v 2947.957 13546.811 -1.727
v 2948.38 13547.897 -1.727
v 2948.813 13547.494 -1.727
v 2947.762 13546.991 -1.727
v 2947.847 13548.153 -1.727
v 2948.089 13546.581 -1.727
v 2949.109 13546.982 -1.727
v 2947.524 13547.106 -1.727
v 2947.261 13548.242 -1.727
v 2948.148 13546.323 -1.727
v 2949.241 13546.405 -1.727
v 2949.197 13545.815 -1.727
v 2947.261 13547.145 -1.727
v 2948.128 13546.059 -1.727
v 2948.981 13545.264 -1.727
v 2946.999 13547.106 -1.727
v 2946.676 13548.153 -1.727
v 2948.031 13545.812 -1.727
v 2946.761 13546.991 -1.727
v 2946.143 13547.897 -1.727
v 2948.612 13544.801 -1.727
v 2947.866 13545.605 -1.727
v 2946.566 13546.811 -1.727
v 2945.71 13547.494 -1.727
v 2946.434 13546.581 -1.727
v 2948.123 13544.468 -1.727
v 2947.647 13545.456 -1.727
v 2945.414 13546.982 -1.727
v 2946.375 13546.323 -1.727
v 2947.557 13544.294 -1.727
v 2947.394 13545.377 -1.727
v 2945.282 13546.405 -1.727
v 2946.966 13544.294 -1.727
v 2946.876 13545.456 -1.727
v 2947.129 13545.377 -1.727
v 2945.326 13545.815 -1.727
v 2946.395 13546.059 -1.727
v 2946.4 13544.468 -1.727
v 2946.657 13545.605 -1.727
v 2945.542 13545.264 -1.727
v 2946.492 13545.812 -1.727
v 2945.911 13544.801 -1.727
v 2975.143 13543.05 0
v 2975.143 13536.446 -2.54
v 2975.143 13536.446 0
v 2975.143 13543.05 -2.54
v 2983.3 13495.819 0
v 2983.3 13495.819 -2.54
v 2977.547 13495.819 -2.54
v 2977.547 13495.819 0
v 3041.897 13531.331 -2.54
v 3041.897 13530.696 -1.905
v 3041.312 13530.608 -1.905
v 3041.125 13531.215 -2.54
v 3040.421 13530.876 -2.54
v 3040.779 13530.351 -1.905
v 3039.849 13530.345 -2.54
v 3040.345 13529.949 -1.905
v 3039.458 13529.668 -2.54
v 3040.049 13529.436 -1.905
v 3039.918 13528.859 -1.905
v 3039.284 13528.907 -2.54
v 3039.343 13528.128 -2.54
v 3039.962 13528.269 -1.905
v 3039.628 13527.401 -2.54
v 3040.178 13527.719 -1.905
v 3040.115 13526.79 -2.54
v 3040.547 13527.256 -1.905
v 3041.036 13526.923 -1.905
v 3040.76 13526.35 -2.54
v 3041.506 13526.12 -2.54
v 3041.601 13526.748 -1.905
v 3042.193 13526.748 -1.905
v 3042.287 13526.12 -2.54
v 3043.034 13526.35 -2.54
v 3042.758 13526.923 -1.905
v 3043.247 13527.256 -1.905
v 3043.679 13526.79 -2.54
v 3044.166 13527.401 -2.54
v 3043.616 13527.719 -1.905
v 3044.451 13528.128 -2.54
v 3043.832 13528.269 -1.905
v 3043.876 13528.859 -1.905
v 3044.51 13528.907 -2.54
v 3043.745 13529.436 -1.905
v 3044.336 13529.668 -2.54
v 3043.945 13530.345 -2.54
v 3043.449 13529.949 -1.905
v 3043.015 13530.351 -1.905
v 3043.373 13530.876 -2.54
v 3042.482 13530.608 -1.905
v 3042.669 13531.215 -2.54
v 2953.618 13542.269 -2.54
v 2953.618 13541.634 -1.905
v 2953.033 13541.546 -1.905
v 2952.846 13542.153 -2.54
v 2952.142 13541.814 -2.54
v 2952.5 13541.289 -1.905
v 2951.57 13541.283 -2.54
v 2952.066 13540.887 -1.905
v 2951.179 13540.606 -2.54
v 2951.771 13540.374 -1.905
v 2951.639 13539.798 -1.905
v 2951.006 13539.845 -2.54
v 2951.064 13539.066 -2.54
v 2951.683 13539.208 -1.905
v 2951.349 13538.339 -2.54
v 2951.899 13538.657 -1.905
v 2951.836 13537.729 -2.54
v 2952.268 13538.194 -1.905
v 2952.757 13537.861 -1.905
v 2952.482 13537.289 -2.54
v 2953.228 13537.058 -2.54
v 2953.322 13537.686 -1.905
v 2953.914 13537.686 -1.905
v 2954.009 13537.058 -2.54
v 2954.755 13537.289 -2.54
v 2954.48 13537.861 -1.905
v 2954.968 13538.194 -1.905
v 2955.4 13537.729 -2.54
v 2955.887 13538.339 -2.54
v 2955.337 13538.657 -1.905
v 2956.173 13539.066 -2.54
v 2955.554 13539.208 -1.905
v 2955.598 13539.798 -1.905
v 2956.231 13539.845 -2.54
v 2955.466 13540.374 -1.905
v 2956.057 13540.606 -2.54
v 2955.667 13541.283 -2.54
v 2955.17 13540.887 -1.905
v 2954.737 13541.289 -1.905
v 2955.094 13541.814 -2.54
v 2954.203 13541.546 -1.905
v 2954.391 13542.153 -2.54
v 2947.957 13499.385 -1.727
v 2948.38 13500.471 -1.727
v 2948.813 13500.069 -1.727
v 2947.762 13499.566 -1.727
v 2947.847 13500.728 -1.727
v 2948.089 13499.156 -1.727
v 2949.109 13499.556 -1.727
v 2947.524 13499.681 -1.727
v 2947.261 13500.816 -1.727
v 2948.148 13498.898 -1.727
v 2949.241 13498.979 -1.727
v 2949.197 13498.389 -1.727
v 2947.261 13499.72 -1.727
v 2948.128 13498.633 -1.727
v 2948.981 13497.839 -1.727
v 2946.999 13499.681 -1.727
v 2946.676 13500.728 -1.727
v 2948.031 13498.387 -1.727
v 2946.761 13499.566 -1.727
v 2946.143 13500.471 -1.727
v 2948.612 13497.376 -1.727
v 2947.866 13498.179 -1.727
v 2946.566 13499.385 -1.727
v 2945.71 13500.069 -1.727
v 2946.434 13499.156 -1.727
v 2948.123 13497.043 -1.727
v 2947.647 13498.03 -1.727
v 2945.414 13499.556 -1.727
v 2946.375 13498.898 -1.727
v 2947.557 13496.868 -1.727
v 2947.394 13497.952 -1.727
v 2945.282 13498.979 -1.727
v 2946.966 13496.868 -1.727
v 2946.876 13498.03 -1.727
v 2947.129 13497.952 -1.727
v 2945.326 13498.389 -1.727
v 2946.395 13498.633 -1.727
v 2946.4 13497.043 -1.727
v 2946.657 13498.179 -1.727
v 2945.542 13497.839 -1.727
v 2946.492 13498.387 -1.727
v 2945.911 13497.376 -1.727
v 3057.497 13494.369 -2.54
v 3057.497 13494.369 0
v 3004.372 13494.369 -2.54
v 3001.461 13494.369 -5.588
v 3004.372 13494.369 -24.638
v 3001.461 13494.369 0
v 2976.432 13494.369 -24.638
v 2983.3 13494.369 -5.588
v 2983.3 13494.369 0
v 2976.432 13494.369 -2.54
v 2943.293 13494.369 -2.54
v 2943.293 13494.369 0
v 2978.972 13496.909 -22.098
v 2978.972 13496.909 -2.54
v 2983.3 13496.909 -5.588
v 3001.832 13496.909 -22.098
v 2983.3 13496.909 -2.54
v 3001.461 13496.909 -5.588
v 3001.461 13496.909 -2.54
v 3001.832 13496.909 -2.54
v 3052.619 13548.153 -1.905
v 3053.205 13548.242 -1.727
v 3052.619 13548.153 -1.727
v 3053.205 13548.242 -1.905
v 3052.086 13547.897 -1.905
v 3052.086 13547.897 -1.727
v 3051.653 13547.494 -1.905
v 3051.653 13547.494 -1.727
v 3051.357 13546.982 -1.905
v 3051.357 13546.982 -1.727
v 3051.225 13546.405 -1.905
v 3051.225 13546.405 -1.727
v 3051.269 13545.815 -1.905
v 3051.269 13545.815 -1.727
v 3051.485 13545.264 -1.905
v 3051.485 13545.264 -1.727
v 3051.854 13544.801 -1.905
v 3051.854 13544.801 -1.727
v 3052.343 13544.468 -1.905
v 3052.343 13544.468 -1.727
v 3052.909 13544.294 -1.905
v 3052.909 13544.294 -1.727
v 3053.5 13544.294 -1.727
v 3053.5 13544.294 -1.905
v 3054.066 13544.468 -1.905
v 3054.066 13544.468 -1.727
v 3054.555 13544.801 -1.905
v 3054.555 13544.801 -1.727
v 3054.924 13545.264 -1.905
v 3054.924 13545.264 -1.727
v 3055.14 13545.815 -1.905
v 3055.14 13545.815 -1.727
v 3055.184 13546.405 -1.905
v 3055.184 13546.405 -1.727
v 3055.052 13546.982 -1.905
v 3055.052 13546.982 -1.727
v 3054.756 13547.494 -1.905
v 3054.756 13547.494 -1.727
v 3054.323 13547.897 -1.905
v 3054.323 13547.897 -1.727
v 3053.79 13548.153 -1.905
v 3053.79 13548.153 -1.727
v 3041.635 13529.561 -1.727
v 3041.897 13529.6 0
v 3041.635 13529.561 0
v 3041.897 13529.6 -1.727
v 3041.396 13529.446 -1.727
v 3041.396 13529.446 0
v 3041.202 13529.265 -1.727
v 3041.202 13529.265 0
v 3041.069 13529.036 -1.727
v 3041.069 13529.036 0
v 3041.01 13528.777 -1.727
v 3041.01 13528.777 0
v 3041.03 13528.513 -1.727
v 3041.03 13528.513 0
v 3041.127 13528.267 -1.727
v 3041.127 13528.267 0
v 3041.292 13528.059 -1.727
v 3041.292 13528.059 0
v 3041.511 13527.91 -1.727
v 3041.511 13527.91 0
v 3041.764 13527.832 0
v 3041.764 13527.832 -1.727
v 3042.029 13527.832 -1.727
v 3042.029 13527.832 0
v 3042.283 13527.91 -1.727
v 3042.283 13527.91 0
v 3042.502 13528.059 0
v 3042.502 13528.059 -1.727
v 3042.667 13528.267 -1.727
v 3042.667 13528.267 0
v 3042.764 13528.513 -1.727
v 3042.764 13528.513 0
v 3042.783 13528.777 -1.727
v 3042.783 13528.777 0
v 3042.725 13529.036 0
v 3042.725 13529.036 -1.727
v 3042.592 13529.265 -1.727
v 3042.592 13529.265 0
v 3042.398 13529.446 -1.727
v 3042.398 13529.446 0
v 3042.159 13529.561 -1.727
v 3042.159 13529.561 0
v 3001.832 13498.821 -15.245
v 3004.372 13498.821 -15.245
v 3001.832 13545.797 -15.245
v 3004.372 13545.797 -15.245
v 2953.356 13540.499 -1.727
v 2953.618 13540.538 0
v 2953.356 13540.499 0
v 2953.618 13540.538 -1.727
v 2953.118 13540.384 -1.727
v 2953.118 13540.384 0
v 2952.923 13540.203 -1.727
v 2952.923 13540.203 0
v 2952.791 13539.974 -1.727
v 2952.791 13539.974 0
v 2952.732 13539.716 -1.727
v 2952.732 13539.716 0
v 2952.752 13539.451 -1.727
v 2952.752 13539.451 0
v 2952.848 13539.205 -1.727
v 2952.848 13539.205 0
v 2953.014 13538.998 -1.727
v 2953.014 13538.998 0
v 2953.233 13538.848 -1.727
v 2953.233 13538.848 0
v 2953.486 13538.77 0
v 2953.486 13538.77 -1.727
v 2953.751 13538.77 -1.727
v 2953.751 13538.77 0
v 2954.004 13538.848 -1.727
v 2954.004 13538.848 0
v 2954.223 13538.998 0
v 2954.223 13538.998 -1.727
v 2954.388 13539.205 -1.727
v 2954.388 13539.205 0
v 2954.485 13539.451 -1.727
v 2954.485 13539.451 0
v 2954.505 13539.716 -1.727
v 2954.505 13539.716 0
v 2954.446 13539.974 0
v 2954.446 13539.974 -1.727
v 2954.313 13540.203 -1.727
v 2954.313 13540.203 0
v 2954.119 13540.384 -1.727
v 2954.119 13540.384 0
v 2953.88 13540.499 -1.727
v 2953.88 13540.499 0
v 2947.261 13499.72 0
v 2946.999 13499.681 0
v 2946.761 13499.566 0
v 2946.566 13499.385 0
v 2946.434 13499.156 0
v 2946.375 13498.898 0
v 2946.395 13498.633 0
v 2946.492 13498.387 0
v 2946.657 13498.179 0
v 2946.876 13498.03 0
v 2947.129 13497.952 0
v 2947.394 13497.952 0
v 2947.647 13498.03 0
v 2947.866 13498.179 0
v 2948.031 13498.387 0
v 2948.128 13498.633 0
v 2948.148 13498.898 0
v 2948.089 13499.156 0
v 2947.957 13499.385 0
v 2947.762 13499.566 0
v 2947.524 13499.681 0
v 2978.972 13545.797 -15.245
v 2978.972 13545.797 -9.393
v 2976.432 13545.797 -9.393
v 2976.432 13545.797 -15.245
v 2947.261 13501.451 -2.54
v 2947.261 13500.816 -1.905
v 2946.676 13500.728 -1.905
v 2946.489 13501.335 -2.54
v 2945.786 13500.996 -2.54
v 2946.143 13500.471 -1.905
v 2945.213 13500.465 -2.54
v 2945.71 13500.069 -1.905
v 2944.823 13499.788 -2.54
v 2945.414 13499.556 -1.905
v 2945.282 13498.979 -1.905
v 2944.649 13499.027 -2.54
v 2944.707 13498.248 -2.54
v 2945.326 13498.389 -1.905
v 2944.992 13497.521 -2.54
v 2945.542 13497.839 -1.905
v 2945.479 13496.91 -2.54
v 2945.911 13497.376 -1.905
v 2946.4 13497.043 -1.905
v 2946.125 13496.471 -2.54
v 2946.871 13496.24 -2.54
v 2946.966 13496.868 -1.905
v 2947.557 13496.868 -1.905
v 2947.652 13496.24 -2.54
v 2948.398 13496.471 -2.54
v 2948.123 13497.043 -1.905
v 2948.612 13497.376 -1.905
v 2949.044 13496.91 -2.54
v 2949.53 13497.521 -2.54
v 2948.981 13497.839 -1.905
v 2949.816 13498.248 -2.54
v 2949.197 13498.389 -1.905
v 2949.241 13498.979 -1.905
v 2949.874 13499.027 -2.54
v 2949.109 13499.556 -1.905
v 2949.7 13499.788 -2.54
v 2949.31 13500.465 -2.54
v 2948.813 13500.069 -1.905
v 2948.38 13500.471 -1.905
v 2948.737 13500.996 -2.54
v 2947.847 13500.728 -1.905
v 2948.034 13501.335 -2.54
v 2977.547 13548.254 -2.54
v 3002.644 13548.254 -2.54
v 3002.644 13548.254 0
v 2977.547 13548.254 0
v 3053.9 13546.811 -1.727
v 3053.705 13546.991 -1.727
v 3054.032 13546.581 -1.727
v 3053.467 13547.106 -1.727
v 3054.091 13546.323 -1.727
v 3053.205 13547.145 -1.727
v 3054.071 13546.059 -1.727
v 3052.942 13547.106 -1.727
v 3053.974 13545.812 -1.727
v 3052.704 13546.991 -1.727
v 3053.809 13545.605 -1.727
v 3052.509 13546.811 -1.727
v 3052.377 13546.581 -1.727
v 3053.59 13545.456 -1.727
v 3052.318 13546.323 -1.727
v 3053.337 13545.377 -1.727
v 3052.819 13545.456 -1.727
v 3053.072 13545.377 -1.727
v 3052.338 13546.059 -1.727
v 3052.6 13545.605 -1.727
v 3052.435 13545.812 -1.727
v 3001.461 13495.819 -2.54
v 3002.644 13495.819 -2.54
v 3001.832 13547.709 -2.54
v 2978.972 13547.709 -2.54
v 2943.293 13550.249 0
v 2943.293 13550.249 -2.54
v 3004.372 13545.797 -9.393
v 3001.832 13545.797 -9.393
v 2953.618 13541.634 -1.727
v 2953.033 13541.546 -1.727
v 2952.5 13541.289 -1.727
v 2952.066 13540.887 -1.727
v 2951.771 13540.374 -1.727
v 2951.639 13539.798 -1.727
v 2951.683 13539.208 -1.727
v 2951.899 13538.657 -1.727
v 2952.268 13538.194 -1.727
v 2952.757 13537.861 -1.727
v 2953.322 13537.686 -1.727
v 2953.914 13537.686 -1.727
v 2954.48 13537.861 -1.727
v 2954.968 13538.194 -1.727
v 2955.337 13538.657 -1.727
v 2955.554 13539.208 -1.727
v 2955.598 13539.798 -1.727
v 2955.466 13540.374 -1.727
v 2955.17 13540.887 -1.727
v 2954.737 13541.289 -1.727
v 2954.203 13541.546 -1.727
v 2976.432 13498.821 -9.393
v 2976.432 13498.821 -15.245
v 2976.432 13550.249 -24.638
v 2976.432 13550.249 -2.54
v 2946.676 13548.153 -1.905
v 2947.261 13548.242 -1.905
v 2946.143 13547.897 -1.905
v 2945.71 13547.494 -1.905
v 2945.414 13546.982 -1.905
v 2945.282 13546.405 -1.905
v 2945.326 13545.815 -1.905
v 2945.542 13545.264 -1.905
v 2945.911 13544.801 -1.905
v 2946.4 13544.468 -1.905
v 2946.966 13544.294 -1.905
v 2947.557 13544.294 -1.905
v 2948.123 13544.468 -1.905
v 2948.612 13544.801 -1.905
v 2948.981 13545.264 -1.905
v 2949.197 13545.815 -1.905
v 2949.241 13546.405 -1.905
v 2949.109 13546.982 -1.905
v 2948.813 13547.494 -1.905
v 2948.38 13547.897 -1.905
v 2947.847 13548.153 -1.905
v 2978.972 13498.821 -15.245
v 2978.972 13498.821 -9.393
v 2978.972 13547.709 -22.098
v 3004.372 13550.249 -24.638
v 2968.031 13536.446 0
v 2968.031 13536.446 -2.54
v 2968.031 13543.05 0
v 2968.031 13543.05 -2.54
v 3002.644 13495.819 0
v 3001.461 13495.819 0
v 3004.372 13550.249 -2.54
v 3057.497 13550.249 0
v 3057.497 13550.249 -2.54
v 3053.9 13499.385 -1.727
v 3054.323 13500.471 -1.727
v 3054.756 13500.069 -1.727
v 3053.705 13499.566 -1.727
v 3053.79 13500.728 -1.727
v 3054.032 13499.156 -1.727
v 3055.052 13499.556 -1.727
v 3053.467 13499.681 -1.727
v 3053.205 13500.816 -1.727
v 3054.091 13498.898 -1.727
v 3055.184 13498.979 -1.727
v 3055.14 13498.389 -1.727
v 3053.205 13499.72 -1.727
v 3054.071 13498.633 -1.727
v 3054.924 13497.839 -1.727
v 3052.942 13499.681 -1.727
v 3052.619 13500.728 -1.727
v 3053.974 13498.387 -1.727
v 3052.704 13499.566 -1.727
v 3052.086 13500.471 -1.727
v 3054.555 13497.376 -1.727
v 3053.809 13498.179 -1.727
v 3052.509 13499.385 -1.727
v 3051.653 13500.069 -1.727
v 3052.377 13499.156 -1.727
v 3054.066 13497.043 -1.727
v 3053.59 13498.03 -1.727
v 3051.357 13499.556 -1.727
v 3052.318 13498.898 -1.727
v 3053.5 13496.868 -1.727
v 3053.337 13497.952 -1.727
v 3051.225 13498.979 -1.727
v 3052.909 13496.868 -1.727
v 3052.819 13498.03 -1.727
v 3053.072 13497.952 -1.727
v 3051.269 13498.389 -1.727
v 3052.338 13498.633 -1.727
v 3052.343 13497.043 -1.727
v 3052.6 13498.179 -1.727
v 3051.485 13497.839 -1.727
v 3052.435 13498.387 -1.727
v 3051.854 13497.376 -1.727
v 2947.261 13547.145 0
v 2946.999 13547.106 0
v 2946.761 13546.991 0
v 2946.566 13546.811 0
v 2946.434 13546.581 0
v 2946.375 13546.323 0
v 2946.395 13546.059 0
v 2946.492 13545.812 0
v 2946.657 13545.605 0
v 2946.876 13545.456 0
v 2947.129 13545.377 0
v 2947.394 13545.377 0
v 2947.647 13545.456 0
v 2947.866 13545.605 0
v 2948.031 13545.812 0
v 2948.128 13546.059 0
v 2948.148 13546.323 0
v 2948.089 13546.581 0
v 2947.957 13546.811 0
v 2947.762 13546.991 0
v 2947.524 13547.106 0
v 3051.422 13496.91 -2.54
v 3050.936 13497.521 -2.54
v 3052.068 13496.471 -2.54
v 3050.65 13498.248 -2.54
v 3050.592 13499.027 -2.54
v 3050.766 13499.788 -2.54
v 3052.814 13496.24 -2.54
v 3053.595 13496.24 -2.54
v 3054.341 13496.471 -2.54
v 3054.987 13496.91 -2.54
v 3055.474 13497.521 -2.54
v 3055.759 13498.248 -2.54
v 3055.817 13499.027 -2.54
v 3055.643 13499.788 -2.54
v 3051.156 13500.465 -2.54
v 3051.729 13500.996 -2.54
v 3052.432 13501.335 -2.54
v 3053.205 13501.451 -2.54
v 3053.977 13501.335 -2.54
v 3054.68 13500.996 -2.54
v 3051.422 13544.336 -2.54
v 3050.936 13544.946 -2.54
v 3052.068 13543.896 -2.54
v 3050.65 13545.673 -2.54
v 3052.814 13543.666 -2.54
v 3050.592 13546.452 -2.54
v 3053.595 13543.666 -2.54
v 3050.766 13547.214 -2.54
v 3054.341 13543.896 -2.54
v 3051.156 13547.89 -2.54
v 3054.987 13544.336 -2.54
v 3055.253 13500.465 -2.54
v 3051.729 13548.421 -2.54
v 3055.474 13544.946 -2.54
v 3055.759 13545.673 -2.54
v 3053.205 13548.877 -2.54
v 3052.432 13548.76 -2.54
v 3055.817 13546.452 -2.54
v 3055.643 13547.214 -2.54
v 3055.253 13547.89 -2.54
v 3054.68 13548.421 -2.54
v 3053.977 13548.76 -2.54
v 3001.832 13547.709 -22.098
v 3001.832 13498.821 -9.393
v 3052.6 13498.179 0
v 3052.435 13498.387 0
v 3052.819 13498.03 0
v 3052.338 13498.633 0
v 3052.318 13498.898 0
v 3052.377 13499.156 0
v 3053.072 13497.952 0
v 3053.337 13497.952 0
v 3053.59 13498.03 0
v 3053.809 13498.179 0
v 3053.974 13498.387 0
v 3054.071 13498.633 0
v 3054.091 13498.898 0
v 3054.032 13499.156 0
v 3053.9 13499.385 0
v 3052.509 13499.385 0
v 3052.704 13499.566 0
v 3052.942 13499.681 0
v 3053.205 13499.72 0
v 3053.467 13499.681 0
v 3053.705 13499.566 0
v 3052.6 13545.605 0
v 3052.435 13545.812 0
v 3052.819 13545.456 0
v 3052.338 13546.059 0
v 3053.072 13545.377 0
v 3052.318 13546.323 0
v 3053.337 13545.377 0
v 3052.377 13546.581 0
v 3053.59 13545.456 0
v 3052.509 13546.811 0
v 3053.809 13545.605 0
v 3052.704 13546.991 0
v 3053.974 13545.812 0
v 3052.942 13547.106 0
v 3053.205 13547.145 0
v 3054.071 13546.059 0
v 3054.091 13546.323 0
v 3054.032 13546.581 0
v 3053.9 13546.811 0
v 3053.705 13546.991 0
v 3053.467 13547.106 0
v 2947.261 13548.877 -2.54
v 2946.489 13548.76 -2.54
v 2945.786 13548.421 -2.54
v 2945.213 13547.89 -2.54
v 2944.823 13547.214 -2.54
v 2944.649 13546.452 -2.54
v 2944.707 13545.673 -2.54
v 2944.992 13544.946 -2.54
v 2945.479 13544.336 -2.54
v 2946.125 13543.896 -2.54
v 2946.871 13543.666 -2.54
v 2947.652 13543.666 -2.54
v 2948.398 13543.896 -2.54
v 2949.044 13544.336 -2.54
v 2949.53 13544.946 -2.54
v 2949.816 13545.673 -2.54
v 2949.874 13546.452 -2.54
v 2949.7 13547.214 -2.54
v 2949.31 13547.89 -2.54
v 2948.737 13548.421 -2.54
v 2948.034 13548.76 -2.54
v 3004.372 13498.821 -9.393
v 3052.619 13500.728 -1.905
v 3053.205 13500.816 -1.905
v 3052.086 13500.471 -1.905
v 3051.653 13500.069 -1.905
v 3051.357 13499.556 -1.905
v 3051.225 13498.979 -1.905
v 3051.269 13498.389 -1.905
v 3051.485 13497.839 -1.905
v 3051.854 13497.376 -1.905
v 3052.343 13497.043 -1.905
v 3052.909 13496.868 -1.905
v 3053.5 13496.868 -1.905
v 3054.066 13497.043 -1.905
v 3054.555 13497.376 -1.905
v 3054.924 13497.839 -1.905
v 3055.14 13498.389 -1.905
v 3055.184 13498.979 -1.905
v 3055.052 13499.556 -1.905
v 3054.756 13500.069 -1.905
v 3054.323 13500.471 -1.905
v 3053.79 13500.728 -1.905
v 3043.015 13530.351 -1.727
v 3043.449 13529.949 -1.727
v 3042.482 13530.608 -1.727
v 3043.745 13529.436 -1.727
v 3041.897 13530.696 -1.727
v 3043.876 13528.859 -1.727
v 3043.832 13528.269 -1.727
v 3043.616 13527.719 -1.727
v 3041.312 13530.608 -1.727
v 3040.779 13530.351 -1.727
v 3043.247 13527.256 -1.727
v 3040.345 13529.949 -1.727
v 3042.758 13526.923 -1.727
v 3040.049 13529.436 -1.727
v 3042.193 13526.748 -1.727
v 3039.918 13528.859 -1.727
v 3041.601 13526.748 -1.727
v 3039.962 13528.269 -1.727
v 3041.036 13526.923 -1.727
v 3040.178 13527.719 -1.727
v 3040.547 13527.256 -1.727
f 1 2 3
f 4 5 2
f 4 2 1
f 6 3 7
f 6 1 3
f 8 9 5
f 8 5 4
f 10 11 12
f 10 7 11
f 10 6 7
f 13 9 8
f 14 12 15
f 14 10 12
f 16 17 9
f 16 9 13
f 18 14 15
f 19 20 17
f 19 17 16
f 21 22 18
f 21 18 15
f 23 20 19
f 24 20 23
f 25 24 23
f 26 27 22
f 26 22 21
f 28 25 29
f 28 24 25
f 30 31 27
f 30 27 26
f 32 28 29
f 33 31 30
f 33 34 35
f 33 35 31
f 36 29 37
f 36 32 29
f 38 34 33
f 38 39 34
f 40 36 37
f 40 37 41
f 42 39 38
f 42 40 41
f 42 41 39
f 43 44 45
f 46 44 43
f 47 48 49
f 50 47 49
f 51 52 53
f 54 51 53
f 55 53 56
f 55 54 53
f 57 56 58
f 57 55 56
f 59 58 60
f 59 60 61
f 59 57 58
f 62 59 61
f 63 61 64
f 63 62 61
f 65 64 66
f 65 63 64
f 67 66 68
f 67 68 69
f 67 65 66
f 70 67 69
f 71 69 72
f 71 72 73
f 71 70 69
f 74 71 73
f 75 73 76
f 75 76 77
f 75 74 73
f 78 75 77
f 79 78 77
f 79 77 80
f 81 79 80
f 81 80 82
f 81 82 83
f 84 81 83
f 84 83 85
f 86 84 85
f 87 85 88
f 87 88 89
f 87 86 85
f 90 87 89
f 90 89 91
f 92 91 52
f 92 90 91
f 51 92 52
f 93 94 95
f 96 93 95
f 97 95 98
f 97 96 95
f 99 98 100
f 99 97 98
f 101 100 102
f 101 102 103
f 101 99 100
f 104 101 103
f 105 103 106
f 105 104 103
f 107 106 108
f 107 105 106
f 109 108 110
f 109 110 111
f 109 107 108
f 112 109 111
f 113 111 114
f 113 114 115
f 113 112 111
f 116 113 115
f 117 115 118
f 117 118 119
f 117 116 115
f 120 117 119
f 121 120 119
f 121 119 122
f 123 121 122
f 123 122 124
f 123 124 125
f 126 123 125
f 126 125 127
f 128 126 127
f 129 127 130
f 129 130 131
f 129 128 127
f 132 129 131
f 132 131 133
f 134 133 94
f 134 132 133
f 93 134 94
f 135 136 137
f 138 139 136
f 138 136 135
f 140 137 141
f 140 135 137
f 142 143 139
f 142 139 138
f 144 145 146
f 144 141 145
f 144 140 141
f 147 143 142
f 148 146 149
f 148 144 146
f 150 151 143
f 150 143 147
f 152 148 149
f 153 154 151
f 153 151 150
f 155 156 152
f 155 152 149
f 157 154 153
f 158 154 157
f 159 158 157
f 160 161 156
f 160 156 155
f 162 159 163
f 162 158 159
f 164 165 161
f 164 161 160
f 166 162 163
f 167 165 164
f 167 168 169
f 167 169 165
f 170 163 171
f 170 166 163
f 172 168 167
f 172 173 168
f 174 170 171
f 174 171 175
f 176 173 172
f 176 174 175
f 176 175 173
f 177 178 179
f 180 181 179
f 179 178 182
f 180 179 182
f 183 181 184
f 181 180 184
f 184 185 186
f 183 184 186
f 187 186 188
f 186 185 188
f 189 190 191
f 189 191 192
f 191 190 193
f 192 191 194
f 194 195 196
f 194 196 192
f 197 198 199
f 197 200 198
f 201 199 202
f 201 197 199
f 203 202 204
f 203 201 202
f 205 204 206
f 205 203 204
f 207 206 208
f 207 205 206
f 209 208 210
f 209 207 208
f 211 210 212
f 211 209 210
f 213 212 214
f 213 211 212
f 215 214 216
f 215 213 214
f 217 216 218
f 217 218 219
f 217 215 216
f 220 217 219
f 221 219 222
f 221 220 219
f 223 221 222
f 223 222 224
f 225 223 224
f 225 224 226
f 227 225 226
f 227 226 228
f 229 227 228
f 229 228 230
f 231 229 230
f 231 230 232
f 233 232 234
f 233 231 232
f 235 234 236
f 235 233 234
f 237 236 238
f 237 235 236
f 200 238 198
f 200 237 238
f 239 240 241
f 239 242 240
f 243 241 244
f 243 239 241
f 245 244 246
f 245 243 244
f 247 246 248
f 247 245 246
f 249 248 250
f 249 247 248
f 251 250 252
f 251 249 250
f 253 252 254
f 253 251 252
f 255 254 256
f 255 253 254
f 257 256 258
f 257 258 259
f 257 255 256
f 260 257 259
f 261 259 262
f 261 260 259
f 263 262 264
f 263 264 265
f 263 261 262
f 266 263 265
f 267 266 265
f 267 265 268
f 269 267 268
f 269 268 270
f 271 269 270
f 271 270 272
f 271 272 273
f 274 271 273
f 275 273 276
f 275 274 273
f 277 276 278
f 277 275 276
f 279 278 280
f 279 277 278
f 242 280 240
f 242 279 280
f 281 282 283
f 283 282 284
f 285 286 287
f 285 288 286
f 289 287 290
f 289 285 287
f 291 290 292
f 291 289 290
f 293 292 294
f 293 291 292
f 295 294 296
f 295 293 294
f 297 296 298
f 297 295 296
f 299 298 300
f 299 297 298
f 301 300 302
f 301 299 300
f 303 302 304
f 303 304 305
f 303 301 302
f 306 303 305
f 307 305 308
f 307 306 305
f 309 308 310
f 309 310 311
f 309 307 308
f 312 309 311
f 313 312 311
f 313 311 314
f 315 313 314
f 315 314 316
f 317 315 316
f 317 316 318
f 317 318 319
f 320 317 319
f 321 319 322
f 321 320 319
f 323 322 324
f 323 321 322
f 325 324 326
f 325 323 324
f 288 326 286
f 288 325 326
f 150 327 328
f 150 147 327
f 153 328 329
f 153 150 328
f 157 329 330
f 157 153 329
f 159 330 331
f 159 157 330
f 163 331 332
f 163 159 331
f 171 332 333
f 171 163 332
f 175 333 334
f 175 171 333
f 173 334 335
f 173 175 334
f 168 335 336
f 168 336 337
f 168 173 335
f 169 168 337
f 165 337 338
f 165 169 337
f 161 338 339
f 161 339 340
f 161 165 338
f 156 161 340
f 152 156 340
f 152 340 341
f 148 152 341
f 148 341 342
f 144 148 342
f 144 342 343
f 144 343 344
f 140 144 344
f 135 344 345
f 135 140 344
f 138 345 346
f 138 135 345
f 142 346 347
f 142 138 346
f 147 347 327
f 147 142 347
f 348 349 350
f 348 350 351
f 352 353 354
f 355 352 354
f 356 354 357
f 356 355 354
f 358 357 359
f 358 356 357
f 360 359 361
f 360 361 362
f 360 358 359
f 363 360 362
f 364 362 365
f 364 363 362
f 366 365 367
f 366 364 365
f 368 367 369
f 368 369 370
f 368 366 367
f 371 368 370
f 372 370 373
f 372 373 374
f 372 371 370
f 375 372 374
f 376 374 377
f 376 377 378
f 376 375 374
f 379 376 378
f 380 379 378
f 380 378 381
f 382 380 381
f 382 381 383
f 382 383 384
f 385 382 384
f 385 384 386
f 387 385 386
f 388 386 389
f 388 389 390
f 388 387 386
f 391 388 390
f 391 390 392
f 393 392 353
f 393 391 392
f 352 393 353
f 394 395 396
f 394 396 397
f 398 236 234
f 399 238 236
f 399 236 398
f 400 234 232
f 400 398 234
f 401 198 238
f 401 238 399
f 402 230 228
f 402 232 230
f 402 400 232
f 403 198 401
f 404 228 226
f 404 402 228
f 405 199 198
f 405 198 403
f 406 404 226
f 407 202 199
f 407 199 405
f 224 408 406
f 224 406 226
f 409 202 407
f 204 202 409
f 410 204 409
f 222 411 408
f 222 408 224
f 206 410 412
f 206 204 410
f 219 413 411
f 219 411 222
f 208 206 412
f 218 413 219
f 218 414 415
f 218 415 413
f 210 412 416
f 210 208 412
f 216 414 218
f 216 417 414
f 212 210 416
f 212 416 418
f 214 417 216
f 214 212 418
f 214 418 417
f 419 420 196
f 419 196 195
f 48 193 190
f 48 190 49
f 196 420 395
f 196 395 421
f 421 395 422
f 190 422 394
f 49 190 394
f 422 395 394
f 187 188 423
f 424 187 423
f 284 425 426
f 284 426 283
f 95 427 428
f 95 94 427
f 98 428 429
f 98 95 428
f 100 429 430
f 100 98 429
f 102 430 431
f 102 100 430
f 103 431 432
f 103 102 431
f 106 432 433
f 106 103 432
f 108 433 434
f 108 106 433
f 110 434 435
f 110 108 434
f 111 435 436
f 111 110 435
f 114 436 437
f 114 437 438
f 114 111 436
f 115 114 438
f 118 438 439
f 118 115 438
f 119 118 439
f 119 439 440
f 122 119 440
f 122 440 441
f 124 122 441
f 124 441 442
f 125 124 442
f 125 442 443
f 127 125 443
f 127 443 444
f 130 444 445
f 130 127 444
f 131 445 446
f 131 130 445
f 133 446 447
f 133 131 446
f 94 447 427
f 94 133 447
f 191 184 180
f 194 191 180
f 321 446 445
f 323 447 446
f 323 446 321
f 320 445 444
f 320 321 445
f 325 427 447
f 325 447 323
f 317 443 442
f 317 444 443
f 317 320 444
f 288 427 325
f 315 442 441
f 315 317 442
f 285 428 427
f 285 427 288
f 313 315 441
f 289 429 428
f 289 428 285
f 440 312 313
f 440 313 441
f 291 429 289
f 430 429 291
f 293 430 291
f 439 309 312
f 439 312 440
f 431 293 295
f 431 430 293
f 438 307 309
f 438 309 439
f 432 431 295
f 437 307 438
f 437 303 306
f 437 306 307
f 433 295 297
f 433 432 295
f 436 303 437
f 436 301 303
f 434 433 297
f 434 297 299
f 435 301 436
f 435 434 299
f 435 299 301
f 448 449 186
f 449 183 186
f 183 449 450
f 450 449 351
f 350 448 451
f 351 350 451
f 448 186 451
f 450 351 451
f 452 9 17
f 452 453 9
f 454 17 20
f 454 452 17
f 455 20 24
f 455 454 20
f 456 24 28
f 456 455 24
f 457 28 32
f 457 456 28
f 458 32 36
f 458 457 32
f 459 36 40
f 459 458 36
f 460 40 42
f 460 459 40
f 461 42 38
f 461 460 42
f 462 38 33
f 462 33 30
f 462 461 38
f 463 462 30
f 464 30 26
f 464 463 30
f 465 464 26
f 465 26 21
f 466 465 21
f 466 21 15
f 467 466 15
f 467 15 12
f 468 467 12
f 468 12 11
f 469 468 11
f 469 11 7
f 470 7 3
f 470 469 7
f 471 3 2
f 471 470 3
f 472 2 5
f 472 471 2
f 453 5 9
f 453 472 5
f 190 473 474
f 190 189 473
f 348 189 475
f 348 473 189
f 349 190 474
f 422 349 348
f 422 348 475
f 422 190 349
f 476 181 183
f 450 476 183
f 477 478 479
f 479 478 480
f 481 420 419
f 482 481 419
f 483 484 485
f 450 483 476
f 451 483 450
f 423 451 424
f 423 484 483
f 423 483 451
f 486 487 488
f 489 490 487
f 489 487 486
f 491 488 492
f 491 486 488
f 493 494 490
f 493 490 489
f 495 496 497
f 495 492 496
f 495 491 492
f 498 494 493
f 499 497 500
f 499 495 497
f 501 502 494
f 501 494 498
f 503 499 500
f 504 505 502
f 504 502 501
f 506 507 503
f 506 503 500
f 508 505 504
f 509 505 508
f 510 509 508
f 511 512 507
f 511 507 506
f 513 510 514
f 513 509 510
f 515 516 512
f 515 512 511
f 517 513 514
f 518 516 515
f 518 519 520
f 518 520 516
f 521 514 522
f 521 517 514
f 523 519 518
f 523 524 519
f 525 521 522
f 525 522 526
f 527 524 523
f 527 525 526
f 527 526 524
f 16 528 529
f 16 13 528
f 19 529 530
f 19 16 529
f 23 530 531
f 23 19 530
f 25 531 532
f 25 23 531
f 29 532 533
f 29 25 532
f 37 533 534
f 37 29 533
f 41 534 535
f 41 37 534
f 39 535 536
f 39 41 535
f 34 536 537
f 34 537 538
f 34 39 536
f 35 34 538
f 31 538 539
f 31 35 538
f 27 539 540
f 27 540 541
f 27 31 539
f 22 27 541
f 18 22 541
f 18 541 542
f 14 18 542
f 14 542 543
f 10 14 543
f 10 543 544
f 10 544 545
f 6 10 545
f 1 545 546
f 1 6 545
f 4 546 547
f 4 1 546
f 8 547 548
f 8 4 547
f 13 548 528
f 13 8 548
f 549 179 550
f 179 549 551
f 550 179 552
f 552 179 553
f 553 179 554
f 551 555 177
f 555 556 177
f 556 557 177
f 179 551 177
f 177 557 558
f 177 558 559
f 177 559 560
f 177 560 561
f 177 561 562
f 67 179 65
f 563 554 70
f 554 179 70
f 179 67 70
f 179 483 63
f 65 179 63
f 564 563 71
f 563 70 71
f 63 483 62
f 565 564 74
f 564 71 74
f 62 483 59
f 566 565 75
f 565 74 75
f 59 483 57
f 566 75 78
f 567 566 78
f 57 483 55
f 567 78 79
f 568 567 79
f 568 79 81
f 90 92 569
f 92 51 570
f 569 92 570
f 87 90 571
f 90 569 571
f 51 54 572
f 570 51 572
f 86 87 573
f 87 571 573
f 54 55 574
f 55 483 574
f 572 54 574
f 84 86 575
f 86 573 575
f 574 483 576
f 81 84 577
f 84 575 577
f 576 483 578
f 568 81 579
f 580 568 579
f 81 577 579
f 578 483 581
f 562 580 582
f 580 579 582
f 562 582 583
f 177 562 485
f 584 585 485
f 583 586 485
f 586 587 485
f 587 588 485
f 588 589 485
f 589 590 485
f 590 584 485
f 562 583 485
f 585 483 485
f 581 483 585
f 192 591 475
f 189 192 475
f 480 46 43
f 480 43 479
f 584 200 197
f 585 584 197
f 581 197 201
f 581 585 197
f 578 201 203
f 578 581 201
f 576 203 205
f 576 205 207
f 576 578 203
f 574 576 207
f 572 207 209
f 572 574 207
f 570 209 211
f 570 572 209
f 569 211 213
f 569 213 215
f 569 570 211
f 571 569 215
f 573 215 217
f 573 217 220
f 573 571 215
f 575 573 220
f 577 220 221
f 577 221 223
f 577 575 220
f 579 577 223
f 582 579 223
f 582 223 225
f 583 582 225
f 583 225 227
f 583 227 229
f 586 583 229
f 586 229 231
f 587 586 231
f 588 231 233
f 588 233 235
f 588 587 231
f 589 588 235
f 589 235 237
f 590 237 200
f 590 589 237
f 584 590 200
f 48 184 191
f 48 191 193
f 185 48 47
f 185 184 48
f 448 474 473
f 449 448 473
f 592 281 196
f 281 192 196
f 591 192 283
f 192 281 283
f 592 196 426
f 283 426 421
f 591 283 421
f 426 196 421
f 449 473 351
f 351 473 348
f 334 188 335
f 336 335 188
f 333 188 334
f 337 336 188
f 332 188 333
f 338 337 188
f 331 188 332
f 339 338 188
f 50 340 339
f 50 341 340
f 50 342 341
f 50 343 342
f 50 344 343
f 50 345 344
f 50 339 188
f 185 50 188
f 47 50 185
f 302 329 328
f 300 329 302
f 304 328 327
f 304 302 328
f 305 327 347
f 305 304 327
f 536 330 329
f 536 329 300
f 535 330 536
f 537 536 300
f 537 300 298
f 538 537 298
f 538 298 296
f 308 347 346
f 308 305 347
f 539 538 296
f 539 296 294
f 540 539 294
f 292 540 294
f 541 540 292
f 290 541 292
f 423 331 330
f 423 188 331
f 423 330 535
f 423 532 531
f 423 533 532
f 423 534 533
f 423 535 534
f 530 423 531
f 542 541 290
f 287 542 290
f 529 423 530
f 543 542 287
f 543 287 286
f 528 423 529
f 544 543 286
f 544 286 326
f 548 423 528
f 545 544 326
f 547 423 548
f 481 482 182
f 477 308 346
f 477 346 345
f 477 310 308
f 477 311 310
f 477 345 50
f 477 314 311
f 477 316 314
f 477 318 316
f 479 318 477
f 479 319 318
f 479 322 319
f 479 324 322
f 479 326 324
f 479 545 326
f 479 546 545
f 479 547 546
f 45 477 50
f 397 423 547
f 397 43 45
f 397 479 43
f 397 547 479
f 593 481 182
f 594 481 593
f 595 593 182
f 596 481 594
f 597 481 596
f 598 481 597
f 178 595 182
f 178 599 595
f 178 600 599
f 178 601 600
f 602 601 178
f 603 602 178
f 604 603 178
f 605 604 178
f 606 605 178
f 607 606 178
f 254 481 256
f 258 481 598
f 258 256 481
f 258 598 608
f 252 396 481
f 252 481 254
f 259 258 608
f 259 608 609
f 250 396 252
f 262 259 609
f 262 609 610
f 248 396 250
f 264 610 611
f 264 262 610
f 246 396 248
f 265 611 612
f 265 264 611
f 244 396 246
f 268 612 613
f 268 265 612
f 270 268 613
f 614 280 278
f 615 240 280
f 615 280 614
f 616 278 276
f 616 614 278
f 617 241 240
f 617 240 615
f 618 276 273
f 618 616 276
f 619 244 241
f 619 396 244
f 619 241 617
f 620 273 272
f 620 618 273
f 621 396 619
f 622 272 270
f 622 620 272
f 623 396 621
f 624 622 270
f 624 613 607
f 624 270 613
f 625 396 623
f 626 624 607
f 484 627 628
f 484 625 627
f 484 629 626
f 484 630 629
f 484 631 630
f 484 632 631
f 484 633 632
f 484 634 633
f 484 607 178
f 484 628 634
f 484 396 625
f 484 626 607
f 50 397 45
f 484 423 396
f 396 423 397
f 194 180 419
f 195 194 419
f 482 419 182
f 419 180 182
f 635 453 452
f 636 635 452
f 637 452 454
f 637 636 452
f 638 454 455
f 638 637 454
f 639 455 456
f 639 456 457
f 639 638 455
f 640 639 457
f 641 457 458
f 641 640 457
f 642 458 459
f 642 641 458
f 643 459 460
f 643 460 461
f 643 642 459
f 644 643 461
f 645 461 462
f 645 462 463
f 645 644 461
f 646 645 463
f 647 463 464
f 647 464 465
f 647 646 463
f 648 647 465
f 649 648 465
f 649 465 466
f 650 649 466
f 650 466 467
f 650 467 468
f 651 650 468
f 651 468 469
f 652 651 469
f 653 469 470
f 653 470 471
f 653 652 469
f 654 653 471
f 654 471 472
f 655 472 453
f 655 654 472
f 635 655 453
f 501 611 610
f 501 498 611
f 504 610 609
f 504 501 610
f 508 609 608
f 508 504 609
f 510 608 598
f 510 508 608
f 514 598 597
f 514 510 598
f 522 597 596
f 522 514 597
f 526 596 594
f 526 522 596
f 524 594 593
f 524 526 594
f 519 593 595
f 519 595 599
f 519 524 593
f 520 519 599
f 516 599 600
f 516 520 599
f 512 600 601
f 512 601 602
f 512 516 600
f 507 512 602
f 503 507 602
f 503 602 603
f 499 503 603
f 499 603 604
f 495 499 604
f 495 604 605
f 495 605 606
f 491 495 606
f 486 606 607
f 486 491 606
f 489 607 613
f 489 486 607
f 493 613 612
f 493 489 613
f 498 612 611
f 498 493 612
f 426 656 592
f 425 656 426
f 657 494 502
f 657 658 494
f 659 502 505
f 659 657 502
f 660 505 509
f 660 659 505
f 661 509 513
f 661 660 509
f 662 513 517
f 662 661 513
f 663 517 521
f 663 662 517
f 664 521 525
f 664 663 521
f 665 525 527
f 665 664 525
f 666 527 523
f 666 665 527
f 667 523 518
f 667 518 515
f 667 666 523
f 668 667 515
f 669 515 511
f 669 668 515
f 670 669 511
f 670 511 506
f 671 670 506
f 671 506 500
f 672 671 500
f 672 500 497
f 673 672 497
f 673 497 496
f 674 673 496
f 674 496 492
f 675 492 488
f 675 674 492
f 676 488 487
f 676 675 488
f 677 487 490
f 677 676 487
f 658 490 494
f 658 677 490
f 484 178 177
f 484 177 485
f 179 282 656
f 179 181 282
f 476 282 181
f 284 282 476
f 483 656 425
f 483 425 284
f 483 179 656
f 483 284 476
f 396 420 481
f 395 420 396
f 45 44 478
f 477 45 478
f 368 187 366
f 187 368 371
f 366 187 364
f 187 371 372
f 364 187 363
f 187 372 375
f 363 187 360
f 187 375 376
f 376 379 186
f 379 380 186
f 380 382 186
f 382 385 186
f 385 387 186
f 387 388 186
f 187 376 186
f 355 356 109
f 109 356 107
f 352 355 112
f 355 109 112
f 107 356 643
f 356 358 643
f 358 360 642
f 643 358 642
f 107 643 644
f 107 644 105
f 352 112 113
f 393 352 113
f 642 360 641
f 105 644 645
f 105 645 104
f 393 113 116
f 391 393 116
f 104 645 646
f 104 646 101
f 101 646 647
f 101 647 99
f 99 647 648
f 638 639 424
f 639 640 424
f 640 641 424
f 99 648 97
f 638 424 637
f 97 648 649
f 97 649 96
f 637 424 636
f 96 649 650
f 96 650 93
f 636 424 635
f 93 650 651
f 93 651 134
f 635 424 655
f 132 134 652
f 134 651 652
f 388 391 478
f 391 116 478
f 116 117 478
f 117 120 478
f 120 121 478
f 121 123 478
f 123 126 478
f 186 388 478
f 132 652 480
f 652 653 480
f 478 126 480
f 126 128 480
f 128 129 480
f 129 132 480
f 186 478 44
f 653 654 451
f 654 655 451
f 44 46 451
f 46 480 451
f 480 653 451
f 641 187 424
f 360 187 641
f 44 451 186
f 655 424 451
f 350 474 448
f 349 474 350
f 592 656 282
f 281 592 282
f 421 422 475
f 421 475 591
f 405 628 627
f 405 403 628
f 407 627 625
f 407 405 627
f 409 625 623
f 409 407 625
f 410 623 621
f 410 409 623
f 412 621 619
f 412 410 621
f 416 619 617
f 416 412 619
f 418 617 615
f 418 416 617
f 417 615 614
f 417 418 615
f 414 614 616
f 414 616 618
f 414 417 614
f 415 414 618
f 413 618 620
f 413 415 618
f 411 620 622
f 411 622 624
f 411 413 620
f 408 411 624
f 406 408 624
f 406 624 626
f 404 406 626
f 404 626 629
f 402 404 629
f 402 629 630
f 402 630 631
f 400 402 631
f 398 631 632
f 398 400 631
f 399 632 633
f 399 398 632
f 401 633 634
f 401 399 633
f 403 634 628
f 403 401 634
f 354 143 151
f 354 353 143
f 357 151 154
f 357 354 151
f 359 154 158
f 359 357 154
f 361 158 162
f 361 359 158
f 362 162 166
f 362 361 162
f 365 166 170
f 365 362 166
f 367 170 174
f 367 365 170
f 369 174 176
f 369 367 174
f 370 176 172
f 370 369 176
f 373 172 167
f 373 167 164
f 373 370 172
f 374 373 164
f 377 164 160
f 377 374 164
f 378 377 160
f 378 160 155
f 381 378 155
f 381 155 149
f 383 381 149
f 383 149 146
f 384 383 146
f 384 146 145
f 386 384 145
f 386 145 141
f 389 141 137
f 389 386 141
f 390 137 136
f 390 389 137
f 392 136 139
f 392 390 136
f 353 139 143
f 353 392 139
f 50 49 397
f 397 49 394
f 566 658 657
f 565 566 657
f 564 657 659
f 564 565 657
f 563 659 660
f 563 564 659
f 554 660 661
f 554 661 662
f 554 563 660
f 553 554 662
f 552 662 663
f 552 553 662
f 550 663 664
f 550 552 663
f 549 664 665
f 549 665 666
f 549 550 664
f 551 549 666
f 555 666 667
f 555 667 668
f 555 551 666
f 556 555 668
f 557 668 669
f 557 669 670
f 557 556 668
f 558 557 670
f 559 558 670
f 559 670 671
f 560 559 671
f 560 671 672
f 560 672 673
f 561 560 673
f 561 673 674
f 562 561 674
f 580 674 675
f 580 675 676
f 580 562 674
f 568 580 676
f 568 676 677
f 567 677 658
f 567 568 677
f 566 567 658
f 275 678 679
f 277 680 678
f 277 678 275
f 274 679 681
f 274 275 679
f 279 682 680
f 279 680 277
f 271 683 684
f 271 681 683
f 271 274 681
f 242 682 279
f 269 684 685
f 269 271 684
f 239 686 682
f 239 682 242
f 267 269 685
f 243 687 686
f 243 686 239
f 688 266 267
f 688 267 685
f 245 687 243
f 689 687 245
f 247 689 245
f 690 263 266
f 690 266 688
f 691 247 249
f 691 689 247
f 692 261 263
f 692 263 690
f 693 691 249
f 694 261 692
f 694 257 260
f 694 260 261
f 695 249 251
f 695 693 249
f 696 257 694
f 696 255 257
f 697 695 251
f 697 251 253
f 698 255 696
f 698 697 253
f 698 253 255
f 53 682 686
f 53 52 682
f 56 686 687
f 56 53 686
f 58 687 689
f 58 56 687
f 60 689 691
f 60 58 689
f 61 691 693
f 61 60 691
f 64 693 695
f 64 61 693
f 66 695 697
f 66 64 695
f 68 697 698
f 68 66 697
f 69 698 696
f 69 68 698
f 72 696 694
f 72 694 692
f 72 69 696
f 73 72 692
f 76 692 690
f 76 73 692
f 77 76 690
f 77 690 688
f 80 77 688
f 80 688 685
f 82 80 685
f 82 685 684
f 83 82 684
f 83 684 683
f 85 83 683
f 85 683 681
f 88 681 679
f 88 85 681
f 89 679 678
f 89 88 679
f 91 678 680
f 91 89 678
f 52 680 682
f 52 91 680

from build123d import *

# Parameters (mm, degrees)
SKETCH1_W                                   = 114.20462943
SKETCH1_H                                   = 55.88
BOSS_EXTRUDE1_DEPTH                         = 2.54
CUT_EXTRUDE2_REACH                          = 13892.916
SKETCH2_W                                   = 7.112
SKETCH2_H                                   = 6.604
SKETCH5_W                                   = 27.94
SKETCH5_H                                   = 55.88
BOSS_EXTRUDE2_DEPTH                         = 19.558
SHELL2_T                                    = -2.54
SKETCH6_W                                   = 25.09706722
SKETCH6_H                                   = 52.434836366
CUT_EXTRUDE3_DEPTH                          = 13891.929495416
SKETCH7_W                                   = 5.85197615
SKETCH7_H                                   = 46.976533267
CUT_EXTRUDE4_DEPTH                          = 13551.404777193
SKETCH8_W                                   = 18.161
SKETCH8_H                                   = 5.588
CUT_EXTRUDE5_DEPTH                          = 19.558
CBORE_FOR_0_BINDING_HEAD_MACHINE_SC_2_COUNT = 2
CBORE_FOR_0_BINDING_HEAD_MACHINE_SC_2_PITCH = 88.953731343
CBORE_FOR_0_BINDING_HEAD_MACHINE_SC_3_COUNT = 2
CBORE_FOR_0_BINDING_HEAD_MACHINE_SC_3_PITCH = 47.42542097
CBORE_FOR_0_BINDING_HEAD_MACHINE_SC_4_COUNT = 2
CBORE_FOR_0_BINDING_HEAD_MACHINE_SC_4_PITCH = 136.214285903
CBORE_FOR_0_BINDING_HEAD_MACHINE_SC_5_COUNT = 2
CBORE_FOR_0_BINDING_HEAD_MACHINE_SC_5_PITCH = 116.073664451
CBORE_FOR_0_BINDING_HEAD_MACHINE_SC_6_COUNT = 2
CBORE_FOR_0_BINDING_HEAD_MACHINE_SC_6_PITCH = 105.943027259
SKETCH16_W                                  = 27.94
SKETCH16_H                                  = 55.88
BOSS_EXTRUDE3_DEPTH                         = 2.54


with BuildPart() as part:
    # Sketch1 → Boss-Extrude1 (new body)
    with BuildSketch(Plane.XY):
        with Locations((3000.394884782, 13522.309097574)):
            Rectangle(SKETCH1_W, SKETCH1_H)
    extrude(amount=-BOSS_EXTRUDE1_DEPTH)

    # Sketch2 → Cut-Extrude2 (cut, up to next)
    with BuildSketch(Plane(origin=(0, 0, -2.54), x_dir=(-1, 0, 0), z_dir=(0, 0, -1)), mode=Mode.PRIVATE) as cut_extrude2_sk1:
        with Locations((-2971.586819557, 13539.747648461)):
            Rectangle(SKETCH2_W, SKETCH2_H)
    cut_extrude2_tool1 = extrude(cut_extrude2_sk1.sketch, amount=-CUT_EXTRUDE2_REACH, mode=Mode.PRIVATE) & part.part
    add(cut_extrude2_tool1.solids().sort_by_distance((2971.58682, 13539.747648, -2.54))[0], mode=Mode.SUBTRACT)

    # Sketch5 → Boss-Extrude2 (add)
    with BuildSketch(Plane(origin=(0, 0, -2.54), x_dir=(-1, 0, 0), z_dir=(0, 0, -1))):
        with Locations((-2990.402009029, 13522.309097574)):
            Rectangle(SKETCH5_W, SKETCH5_H)
    extrude(amount=BOSS_EXTRUDE2_DEPTH)

    # Shell2
    shell2_openings = [part.faces().sort_by_distance(p)[0] for p in [
        (2990.402009029, 13522.309097574, -22.098),
    ]]
    offset(amount=SHELL2_T, openings=shell2_openings, kind=Kind.INTERSECTION)

    # Sketch6 → Cut-Extrude3 (cut, through all)
    with BuildSketch(Plane(origin=(0, 0, -2.54), x_dir=(-1, 0, 0), z_dir=(0, 0, -1))):
        with Locations((-2990.095388415, 13522.03687782)):
            Rectangle(SKETCH6_W, SKETCH6_H)
    extrude(amount=-CUT_EXTRUDE3_DEPTH, mode=Mode.SUBTRACT)

    # Sketch7 → Cut-Extrude4 (cut, through all)
    with BuildSketch(Plane(origin=(3004.372009029, 0, 0), x_dir=(0, 0, -1), z_dir=(1, 0, 0))):
        with Locations((12.319, 13522.309097574)):
            Rectangle(SKETCH7_W, SKETCH7_H)
    extrude(amount=-CUT_EXTRUDE4_DEPTH, mode=Mode.SUBTRACT)

    # Sketch8 → Cut-Extrude5 (cut)
    with BuildSketch(Plane.XZ.offset(-13494.369097574)):
        with Locations((2992.380051535, -2.794)):
            Rectangle(SKETCH8_W, SKETCH8_H)
    extrude(amount=-CUT_EXTRUDE5_DEPTH, mode=Mode.SUBTRACT)

    # Sketch9 → CBORE for #0 Binding Head Machine Screw1 (revolve, cut)
    with BuildSketch(Plane(origin=(3041.896978852, 13528.711016341, -2.54), x_dir=(0, 1, 0), z_dir=(1, 0, 0))):
        Polygon((0, 0), (0, 2.54), (0.889, 2.54), (0.889, 0.8128), (1.98501, 0.8128), (1.98501, 0.635), (2.62001, 0), align=None)
    cbore_for_0_binding_head_machine_screw1 = revolve(axis=Axis((3041.896978852, 13528.711016341, -8.89), (0, 0, 1)), mode=Mode.SUBTRACT)

    # CBORE for _0 Binding Head Machine Sc 2: CBORE for #0 Binding Head Machine Screw1 ×2
    with Locations(*[Vector(-0.992411009873524, 0.12296498477945786, 0) * (i * CBORE_FOR_0_BINDING_HEAD_MACHINE_SC_2_PITCH) for i in range(1, CBORE_FOR_0_BINDING_HEAD_MACHINE_SC_2_COUNT)]):
        add(cbore_for_0_binding_head_machine_screw1, mode=Mode.SUBTRACT)

    # Sketch14 → CBORE for #0 Binding Head Machine Screw2 (revolve, cut)
    with BuildSketch(Plane(origin=(3053.204515133, 13546.256494849, -2.54), x_dir=(0, 1, 0), z_dir=(1, 0, 0))):
        Polygon((0, 0), (0, 2.54), (0.889, 2.54), (0.889, 0.8128), (1.98501, 0.8128), (1.98501, 0.635), (2.62001, 0), align=None)
    cbore_for_0_binding_head_machine_screw2 = revolve(axis=Axis((3053.204515133, 13546.256494849, -8.89), (0, 0, 1)), mode=Mode.SUBTRACT)

    # CBORE for _0 Binding Head Machine Sc 3: CBORE for #0 Binding Head Machine Screw2 ×2
    with Locations(*[(0, -i * CBORE_FOR_0_BINDING_HEAD_MACHINE_SC_3_PITCH, 0) for i in range(1, CBORE_FOR_0_BINDING_HEAD_MACHINE_SC_3_COUNT)]):
        add(cbore_for_0_binding_head_machine_screw2, mode=Mode.SUBTRACT)

    # CBORE for _0 Binding Head Machine Sc 4: CBORE for #0 Binding Head Machine Screw2 ×2
    with Locations(*[Vector(-0.9373151171300654, -0.3484829568278078, 0) * (i * CBORE_FOR_0_BINDING_HEAD_MACHINE_SC_4_PITCH) for i in range(1, CBORE_FOR_0_BINDING_HEAD_MACHINE_SC_4_COUNT)]):
        add(cbore_for_0_binding_head_machine_screw2, mode=Mode.SUBTRACT)

    # CBORE for _0 Binding Head Machine Sc 5: CBORE for #0 Binding Head Machine Screw2 ×2
    with Locations(*[Vector(-0.9127223454224201, -0.4085803717343707, 0) * (i * CBORE_FOR_0_BINDING_HEAD_MACHINE_SC_5_PITCH) for i in range(1, CBORE_FOR_0_BINDING_HEAD_MACHINE_SC_5_COUNT)]):
        add(cbore_for_0_binding_head_machine_screw2, mode=Mode.SUBTRACT)

    # CBORE for _0 Binding Head Machine Sc 6: CBORE for #0 Binding Head Machine Screw2 ×2
    with Locations(*[(-i * CBORE_FOR_0_BINDING_HEAD_MACHINE_SC_6_PITCH, 0, 0) for i in range(1, CBORE_FOR_0_BINDING_HEAD_MACHINE_SC_6_COUNT)]):
        add(cbore_for_0_binding_head_machine_screw2, mode=Mode.SUBTRACT)

    # Sketch16 → Boss-Extrude3 (add)
    with BuildSketch(Plane(origin=(0, 0, -22.098), x_dir=(-1, 0, 0), z_dir=(0, 0, -1))):
        with Locations((-2990.402009029, 13522.309097574)):
            Rectangle(SKETCH16_W, SKETCH16_H)
    extrude(amount=BOSS_EXTRUDE3_DEPTH)


solid = part.part
